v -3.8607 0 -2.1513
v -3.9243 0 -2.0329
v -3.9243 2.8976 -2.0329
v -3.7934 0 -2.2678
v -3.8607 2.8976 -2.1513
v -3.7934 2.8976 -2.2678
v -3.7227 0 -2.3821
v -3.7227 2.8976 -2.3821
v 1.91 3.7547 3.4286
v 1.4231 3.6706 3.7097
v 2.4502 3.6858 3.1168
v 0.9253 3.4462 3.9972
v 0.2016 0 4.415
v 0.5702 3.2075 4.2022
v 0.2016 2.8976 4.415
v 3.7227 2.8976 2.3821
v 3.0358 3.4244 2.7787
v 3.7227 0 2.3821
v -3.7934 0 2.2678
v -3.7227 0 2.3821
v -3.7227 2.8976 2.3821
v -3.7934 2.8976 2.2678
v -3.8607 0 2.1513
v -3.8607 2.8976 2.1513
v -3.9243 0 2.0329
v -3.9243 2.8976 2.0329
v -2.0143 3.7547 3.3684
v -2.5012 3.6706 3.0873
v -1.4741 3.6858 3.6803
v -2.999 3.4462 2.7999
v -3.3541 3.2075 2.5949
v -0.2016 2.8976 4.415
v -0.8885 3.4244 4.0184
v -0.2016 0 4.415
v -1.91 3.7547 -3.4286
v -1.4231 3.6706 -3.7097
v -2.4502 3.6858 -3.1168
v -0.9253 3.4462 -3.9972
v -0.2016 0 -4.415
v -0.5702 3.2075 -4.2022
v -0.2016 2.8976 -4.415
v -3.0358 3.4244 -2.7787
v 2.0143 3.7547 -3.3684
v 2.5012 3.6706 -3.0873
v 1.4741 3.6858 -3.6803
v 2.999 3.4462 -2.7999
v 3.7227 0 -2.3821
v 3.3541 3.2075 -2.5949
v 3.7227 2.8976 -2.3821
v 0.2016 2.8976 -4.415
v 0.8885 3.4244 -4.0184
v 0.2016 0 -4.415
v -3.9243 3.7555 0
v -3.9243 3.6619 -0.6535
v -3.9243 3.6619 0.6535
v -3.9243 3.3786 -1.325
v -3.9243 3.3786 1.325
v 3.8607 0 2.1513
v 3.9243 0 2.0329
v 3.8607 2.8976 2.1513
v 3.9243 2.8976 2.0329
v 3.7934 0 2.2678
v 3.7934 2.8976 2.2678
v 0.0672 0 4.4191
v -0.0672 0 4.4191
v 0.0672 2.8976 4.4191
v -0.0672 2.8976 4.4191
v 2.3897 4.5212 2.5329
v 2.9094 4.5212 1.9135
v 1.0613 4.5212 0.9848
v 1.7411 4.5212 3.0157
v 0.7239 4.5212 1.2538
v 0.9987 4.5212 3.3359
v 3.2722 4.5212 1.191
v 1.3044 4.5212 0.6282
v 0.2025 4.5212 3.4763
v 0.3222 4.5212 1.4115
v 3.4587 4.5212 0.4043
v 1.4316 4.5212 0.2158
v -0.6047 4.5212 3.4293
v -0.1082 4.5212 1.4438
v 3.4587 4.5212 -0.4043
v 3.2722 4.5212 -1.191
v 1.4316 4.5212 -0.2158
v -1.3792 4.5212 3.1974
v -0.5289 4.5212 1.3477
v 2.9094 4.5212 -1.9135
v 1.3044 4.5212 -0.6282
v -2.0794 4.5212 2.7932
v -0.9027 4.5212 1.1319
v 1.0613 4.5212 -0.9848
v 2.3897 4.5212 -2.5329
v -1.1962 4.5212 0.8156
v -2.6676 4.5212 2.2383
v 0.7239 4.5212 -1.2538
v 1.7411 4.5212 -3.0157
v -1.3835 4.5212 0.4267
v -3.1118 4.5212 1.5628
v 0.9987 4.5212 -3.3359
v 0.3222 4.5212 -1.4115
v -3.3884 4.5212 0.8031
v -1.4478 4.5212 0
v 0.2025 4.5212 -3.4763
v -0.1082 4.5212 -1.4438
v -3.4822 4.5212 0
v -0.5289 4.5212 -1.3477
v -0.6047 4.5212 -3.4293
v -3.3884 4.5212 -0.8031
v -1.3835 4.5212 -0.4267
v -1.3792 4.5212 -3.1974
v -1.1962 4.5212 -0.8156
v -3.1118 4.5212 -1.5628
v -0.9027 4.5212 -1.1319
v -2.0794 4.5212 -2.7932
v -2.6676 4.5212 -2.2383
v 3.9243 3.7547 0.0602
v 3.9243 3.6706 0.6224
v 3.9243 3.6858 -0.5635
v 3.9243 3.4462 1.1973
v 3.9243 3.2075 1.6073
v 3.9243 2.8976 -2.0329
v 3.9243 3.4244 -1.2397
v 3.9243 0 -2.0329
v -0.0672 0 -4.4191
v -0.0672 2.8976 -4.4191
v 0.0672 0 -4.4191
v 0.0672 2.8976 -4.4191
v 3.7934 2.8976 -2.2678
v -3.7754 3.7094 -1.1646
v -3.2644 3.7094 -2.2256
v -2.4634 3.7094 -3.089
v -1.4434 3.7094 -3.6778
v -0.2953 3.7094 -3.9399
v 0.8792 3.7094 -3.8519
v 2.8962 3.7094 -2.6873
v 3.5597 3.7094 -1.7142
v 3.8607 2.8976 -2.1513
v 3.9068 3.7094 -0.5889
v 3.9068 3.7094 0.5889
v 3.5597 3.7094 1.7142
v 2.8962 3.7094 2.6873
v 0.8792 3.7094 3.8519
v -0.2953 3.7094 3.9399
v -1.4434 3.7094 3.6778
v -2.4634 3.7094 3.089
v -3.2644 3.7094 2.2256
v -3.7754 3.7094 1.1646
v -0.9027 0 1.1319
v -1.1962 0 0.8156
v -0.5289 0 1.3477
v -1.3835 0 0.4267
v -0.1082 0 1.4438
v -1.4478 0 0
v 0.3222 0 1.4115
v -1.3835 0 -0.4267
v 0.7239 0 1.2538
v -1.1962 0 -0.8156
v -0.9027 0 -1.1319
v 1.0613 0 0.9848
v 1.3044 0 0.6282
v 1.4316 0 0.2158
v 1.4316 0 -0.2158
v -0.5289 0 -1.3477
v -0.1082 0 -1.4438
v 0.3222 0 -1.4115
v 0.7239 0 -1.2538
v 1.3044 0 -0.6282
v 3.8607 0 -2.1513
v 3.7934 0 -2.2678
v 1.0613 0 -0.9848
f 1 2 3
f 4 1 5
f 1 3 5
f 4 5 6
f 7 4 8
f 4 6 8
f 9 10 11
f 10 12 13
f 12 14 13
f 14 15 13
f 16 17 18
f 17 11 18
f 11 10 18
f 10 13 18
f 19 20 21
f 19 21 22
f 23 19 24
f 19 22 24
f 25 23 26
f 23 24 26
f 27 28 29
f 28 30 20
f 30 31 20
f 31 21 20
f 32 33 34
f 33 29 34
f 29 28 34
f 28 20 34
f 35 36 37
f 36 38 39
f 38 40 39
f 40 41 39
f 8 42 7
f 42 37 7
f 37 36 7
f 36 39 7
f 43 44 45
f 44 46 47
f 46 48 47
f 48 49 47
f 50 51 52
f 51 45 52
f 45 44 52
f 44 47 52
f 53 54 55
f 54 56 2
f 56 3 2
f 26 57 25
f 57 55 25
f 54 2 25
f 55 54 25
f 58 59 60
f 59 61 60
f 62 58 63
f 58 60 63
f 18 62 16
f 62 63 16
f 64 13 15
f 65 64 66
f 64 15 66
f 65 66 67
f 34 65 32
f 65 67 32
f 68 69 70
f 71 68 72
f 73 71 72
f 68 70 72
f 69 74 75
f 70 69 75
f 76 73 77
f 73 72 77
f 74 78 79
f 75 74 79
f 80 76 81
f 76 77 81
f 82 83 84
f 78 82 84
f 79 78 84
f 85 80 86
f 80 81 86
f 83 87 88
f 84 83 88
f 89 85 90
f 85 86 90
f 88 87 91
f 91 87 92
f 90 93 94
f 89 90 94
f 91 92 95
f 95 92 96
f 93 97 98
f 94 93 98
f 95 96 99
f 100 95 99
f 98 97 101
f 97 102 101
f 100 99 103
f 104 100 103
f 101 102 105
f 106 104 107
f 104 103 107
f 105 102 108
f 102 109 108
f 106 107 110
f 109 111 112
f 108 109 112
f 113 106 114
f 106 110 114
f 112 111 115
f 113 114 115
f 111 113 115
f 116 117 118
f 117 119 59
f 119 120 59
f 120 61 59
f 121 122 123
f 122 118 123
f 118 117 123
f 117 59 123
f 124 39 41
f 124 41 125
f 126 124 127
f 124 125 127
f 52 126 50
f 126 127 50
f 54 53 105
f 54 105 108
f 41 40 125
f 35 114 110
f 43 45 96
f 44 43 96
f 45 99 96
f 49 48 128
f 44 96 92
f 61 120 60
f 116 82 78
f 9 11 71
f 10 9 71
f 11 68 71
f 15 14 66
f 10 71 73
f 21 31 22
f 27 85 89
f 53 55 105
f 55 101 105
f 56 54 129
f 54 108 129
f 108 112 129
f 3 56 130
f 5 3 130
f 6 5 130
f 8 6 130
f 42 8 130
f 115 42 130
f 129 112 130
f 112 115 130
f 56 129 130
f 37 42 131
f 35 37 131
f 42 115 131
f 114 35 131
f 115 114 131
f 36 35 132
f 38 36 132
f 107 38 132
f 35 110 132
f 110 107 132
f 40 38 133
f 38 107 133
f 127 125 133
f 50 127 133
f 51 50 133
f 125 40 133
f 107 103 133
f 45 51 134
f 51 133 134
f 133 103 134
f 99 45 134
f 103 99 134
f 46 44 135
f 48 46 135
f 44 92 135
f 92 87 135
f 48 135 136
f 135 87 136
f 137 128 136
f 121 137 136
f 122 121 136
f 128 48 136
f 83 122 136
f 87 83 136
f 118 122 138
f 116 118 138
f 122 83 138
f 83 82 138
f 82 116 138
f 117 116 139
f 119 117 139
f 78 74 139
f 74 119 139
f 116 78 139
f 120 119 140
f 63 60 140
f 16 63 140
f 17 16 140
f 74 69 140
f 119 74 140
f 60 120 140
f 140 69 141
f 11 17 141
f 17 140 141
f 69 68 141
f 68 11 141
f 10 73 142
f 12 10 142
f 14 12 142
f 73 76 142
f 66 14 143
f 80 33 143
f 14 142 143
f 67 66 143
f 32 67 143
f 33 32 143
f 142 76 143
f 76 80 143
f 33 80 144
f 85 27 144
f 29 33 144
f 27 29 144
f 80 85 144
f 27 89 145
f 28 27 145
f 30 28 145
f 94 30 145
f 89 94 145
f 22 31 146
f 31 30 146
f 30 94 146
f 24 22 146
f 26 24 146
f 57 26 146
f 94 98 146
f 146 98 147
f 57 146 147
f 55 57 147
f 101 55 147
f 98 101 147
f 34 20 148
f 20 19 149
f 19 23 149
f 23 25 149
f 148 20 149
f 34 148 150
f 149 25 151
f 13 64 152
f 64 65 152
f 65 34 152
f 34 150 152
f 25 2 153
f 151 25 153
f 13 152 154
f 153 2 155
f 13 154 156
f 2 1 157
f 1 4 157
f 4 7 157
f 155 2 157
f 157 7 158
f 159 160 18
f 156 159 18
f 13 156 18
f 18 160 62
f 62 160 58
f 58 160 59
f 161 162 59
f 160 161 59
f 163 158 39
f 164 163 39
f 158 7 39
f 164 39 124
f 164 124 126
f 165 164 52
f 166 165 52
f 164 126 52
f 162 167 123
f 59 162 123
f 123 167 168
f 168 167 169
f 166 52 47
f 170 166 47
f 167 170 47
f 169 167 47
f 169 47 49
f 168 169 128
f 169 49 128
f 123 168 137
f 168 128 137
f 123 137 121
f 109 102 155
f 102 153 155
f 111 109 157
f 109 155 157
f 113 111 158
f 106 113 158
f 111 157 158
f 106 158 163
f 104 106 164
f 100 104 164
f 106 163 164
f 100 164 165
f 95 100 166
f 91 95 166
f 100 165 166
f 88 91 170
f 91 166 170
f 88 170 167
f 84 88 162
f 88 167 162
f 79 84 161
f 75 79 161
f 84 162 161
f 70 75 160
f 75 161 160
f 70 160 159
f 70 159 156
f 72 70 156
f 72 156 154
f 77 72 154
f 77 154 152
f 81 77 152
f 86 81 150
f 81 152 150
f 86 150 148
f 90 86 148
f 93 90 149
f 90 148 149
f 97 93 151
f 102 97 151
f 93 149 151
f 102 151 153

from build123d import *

# Parameters (mm, degrees)
SKETCH2_R      = 8.336997649
EXTRUDE1_DEPTH = 5.5212


with BuildPart() as part:
    # Sketch1 → Revolve1 (revolve)
    with BuildSketch(Plane.XY):
        Polygon((-1.4478, 0), (-4.4196, 0), (-4.4196, 2.897645717), (-3.482240498, 4.5212), (-1.4478, 4.5212), align=None)
    revolve(axis=Axis((0, 4.5212, 0), (0, -1, 0)))

    # Sketch2 → Extrude1 (cut, through all)
    with BuildSketch(Plane(origin=(0, 0, 0), x_dir=(1, 0, 0), z_dir=(0, 1, 0))):
        Circle(SKETCH2_R)
        Polygon((0, 4.531391323), (-3.9243, 2.265695661), (-3.9243, -2.265695661), (0, -4.531391323), (3.9243, -2.265695661), (3.9243, 2.265695661), align=None, mode=Mode.SUBTRACT)
    extrude(amount=EXTRUDE1_DEPTH, mode=Mode.SUBTRACT)


solid = part.part
